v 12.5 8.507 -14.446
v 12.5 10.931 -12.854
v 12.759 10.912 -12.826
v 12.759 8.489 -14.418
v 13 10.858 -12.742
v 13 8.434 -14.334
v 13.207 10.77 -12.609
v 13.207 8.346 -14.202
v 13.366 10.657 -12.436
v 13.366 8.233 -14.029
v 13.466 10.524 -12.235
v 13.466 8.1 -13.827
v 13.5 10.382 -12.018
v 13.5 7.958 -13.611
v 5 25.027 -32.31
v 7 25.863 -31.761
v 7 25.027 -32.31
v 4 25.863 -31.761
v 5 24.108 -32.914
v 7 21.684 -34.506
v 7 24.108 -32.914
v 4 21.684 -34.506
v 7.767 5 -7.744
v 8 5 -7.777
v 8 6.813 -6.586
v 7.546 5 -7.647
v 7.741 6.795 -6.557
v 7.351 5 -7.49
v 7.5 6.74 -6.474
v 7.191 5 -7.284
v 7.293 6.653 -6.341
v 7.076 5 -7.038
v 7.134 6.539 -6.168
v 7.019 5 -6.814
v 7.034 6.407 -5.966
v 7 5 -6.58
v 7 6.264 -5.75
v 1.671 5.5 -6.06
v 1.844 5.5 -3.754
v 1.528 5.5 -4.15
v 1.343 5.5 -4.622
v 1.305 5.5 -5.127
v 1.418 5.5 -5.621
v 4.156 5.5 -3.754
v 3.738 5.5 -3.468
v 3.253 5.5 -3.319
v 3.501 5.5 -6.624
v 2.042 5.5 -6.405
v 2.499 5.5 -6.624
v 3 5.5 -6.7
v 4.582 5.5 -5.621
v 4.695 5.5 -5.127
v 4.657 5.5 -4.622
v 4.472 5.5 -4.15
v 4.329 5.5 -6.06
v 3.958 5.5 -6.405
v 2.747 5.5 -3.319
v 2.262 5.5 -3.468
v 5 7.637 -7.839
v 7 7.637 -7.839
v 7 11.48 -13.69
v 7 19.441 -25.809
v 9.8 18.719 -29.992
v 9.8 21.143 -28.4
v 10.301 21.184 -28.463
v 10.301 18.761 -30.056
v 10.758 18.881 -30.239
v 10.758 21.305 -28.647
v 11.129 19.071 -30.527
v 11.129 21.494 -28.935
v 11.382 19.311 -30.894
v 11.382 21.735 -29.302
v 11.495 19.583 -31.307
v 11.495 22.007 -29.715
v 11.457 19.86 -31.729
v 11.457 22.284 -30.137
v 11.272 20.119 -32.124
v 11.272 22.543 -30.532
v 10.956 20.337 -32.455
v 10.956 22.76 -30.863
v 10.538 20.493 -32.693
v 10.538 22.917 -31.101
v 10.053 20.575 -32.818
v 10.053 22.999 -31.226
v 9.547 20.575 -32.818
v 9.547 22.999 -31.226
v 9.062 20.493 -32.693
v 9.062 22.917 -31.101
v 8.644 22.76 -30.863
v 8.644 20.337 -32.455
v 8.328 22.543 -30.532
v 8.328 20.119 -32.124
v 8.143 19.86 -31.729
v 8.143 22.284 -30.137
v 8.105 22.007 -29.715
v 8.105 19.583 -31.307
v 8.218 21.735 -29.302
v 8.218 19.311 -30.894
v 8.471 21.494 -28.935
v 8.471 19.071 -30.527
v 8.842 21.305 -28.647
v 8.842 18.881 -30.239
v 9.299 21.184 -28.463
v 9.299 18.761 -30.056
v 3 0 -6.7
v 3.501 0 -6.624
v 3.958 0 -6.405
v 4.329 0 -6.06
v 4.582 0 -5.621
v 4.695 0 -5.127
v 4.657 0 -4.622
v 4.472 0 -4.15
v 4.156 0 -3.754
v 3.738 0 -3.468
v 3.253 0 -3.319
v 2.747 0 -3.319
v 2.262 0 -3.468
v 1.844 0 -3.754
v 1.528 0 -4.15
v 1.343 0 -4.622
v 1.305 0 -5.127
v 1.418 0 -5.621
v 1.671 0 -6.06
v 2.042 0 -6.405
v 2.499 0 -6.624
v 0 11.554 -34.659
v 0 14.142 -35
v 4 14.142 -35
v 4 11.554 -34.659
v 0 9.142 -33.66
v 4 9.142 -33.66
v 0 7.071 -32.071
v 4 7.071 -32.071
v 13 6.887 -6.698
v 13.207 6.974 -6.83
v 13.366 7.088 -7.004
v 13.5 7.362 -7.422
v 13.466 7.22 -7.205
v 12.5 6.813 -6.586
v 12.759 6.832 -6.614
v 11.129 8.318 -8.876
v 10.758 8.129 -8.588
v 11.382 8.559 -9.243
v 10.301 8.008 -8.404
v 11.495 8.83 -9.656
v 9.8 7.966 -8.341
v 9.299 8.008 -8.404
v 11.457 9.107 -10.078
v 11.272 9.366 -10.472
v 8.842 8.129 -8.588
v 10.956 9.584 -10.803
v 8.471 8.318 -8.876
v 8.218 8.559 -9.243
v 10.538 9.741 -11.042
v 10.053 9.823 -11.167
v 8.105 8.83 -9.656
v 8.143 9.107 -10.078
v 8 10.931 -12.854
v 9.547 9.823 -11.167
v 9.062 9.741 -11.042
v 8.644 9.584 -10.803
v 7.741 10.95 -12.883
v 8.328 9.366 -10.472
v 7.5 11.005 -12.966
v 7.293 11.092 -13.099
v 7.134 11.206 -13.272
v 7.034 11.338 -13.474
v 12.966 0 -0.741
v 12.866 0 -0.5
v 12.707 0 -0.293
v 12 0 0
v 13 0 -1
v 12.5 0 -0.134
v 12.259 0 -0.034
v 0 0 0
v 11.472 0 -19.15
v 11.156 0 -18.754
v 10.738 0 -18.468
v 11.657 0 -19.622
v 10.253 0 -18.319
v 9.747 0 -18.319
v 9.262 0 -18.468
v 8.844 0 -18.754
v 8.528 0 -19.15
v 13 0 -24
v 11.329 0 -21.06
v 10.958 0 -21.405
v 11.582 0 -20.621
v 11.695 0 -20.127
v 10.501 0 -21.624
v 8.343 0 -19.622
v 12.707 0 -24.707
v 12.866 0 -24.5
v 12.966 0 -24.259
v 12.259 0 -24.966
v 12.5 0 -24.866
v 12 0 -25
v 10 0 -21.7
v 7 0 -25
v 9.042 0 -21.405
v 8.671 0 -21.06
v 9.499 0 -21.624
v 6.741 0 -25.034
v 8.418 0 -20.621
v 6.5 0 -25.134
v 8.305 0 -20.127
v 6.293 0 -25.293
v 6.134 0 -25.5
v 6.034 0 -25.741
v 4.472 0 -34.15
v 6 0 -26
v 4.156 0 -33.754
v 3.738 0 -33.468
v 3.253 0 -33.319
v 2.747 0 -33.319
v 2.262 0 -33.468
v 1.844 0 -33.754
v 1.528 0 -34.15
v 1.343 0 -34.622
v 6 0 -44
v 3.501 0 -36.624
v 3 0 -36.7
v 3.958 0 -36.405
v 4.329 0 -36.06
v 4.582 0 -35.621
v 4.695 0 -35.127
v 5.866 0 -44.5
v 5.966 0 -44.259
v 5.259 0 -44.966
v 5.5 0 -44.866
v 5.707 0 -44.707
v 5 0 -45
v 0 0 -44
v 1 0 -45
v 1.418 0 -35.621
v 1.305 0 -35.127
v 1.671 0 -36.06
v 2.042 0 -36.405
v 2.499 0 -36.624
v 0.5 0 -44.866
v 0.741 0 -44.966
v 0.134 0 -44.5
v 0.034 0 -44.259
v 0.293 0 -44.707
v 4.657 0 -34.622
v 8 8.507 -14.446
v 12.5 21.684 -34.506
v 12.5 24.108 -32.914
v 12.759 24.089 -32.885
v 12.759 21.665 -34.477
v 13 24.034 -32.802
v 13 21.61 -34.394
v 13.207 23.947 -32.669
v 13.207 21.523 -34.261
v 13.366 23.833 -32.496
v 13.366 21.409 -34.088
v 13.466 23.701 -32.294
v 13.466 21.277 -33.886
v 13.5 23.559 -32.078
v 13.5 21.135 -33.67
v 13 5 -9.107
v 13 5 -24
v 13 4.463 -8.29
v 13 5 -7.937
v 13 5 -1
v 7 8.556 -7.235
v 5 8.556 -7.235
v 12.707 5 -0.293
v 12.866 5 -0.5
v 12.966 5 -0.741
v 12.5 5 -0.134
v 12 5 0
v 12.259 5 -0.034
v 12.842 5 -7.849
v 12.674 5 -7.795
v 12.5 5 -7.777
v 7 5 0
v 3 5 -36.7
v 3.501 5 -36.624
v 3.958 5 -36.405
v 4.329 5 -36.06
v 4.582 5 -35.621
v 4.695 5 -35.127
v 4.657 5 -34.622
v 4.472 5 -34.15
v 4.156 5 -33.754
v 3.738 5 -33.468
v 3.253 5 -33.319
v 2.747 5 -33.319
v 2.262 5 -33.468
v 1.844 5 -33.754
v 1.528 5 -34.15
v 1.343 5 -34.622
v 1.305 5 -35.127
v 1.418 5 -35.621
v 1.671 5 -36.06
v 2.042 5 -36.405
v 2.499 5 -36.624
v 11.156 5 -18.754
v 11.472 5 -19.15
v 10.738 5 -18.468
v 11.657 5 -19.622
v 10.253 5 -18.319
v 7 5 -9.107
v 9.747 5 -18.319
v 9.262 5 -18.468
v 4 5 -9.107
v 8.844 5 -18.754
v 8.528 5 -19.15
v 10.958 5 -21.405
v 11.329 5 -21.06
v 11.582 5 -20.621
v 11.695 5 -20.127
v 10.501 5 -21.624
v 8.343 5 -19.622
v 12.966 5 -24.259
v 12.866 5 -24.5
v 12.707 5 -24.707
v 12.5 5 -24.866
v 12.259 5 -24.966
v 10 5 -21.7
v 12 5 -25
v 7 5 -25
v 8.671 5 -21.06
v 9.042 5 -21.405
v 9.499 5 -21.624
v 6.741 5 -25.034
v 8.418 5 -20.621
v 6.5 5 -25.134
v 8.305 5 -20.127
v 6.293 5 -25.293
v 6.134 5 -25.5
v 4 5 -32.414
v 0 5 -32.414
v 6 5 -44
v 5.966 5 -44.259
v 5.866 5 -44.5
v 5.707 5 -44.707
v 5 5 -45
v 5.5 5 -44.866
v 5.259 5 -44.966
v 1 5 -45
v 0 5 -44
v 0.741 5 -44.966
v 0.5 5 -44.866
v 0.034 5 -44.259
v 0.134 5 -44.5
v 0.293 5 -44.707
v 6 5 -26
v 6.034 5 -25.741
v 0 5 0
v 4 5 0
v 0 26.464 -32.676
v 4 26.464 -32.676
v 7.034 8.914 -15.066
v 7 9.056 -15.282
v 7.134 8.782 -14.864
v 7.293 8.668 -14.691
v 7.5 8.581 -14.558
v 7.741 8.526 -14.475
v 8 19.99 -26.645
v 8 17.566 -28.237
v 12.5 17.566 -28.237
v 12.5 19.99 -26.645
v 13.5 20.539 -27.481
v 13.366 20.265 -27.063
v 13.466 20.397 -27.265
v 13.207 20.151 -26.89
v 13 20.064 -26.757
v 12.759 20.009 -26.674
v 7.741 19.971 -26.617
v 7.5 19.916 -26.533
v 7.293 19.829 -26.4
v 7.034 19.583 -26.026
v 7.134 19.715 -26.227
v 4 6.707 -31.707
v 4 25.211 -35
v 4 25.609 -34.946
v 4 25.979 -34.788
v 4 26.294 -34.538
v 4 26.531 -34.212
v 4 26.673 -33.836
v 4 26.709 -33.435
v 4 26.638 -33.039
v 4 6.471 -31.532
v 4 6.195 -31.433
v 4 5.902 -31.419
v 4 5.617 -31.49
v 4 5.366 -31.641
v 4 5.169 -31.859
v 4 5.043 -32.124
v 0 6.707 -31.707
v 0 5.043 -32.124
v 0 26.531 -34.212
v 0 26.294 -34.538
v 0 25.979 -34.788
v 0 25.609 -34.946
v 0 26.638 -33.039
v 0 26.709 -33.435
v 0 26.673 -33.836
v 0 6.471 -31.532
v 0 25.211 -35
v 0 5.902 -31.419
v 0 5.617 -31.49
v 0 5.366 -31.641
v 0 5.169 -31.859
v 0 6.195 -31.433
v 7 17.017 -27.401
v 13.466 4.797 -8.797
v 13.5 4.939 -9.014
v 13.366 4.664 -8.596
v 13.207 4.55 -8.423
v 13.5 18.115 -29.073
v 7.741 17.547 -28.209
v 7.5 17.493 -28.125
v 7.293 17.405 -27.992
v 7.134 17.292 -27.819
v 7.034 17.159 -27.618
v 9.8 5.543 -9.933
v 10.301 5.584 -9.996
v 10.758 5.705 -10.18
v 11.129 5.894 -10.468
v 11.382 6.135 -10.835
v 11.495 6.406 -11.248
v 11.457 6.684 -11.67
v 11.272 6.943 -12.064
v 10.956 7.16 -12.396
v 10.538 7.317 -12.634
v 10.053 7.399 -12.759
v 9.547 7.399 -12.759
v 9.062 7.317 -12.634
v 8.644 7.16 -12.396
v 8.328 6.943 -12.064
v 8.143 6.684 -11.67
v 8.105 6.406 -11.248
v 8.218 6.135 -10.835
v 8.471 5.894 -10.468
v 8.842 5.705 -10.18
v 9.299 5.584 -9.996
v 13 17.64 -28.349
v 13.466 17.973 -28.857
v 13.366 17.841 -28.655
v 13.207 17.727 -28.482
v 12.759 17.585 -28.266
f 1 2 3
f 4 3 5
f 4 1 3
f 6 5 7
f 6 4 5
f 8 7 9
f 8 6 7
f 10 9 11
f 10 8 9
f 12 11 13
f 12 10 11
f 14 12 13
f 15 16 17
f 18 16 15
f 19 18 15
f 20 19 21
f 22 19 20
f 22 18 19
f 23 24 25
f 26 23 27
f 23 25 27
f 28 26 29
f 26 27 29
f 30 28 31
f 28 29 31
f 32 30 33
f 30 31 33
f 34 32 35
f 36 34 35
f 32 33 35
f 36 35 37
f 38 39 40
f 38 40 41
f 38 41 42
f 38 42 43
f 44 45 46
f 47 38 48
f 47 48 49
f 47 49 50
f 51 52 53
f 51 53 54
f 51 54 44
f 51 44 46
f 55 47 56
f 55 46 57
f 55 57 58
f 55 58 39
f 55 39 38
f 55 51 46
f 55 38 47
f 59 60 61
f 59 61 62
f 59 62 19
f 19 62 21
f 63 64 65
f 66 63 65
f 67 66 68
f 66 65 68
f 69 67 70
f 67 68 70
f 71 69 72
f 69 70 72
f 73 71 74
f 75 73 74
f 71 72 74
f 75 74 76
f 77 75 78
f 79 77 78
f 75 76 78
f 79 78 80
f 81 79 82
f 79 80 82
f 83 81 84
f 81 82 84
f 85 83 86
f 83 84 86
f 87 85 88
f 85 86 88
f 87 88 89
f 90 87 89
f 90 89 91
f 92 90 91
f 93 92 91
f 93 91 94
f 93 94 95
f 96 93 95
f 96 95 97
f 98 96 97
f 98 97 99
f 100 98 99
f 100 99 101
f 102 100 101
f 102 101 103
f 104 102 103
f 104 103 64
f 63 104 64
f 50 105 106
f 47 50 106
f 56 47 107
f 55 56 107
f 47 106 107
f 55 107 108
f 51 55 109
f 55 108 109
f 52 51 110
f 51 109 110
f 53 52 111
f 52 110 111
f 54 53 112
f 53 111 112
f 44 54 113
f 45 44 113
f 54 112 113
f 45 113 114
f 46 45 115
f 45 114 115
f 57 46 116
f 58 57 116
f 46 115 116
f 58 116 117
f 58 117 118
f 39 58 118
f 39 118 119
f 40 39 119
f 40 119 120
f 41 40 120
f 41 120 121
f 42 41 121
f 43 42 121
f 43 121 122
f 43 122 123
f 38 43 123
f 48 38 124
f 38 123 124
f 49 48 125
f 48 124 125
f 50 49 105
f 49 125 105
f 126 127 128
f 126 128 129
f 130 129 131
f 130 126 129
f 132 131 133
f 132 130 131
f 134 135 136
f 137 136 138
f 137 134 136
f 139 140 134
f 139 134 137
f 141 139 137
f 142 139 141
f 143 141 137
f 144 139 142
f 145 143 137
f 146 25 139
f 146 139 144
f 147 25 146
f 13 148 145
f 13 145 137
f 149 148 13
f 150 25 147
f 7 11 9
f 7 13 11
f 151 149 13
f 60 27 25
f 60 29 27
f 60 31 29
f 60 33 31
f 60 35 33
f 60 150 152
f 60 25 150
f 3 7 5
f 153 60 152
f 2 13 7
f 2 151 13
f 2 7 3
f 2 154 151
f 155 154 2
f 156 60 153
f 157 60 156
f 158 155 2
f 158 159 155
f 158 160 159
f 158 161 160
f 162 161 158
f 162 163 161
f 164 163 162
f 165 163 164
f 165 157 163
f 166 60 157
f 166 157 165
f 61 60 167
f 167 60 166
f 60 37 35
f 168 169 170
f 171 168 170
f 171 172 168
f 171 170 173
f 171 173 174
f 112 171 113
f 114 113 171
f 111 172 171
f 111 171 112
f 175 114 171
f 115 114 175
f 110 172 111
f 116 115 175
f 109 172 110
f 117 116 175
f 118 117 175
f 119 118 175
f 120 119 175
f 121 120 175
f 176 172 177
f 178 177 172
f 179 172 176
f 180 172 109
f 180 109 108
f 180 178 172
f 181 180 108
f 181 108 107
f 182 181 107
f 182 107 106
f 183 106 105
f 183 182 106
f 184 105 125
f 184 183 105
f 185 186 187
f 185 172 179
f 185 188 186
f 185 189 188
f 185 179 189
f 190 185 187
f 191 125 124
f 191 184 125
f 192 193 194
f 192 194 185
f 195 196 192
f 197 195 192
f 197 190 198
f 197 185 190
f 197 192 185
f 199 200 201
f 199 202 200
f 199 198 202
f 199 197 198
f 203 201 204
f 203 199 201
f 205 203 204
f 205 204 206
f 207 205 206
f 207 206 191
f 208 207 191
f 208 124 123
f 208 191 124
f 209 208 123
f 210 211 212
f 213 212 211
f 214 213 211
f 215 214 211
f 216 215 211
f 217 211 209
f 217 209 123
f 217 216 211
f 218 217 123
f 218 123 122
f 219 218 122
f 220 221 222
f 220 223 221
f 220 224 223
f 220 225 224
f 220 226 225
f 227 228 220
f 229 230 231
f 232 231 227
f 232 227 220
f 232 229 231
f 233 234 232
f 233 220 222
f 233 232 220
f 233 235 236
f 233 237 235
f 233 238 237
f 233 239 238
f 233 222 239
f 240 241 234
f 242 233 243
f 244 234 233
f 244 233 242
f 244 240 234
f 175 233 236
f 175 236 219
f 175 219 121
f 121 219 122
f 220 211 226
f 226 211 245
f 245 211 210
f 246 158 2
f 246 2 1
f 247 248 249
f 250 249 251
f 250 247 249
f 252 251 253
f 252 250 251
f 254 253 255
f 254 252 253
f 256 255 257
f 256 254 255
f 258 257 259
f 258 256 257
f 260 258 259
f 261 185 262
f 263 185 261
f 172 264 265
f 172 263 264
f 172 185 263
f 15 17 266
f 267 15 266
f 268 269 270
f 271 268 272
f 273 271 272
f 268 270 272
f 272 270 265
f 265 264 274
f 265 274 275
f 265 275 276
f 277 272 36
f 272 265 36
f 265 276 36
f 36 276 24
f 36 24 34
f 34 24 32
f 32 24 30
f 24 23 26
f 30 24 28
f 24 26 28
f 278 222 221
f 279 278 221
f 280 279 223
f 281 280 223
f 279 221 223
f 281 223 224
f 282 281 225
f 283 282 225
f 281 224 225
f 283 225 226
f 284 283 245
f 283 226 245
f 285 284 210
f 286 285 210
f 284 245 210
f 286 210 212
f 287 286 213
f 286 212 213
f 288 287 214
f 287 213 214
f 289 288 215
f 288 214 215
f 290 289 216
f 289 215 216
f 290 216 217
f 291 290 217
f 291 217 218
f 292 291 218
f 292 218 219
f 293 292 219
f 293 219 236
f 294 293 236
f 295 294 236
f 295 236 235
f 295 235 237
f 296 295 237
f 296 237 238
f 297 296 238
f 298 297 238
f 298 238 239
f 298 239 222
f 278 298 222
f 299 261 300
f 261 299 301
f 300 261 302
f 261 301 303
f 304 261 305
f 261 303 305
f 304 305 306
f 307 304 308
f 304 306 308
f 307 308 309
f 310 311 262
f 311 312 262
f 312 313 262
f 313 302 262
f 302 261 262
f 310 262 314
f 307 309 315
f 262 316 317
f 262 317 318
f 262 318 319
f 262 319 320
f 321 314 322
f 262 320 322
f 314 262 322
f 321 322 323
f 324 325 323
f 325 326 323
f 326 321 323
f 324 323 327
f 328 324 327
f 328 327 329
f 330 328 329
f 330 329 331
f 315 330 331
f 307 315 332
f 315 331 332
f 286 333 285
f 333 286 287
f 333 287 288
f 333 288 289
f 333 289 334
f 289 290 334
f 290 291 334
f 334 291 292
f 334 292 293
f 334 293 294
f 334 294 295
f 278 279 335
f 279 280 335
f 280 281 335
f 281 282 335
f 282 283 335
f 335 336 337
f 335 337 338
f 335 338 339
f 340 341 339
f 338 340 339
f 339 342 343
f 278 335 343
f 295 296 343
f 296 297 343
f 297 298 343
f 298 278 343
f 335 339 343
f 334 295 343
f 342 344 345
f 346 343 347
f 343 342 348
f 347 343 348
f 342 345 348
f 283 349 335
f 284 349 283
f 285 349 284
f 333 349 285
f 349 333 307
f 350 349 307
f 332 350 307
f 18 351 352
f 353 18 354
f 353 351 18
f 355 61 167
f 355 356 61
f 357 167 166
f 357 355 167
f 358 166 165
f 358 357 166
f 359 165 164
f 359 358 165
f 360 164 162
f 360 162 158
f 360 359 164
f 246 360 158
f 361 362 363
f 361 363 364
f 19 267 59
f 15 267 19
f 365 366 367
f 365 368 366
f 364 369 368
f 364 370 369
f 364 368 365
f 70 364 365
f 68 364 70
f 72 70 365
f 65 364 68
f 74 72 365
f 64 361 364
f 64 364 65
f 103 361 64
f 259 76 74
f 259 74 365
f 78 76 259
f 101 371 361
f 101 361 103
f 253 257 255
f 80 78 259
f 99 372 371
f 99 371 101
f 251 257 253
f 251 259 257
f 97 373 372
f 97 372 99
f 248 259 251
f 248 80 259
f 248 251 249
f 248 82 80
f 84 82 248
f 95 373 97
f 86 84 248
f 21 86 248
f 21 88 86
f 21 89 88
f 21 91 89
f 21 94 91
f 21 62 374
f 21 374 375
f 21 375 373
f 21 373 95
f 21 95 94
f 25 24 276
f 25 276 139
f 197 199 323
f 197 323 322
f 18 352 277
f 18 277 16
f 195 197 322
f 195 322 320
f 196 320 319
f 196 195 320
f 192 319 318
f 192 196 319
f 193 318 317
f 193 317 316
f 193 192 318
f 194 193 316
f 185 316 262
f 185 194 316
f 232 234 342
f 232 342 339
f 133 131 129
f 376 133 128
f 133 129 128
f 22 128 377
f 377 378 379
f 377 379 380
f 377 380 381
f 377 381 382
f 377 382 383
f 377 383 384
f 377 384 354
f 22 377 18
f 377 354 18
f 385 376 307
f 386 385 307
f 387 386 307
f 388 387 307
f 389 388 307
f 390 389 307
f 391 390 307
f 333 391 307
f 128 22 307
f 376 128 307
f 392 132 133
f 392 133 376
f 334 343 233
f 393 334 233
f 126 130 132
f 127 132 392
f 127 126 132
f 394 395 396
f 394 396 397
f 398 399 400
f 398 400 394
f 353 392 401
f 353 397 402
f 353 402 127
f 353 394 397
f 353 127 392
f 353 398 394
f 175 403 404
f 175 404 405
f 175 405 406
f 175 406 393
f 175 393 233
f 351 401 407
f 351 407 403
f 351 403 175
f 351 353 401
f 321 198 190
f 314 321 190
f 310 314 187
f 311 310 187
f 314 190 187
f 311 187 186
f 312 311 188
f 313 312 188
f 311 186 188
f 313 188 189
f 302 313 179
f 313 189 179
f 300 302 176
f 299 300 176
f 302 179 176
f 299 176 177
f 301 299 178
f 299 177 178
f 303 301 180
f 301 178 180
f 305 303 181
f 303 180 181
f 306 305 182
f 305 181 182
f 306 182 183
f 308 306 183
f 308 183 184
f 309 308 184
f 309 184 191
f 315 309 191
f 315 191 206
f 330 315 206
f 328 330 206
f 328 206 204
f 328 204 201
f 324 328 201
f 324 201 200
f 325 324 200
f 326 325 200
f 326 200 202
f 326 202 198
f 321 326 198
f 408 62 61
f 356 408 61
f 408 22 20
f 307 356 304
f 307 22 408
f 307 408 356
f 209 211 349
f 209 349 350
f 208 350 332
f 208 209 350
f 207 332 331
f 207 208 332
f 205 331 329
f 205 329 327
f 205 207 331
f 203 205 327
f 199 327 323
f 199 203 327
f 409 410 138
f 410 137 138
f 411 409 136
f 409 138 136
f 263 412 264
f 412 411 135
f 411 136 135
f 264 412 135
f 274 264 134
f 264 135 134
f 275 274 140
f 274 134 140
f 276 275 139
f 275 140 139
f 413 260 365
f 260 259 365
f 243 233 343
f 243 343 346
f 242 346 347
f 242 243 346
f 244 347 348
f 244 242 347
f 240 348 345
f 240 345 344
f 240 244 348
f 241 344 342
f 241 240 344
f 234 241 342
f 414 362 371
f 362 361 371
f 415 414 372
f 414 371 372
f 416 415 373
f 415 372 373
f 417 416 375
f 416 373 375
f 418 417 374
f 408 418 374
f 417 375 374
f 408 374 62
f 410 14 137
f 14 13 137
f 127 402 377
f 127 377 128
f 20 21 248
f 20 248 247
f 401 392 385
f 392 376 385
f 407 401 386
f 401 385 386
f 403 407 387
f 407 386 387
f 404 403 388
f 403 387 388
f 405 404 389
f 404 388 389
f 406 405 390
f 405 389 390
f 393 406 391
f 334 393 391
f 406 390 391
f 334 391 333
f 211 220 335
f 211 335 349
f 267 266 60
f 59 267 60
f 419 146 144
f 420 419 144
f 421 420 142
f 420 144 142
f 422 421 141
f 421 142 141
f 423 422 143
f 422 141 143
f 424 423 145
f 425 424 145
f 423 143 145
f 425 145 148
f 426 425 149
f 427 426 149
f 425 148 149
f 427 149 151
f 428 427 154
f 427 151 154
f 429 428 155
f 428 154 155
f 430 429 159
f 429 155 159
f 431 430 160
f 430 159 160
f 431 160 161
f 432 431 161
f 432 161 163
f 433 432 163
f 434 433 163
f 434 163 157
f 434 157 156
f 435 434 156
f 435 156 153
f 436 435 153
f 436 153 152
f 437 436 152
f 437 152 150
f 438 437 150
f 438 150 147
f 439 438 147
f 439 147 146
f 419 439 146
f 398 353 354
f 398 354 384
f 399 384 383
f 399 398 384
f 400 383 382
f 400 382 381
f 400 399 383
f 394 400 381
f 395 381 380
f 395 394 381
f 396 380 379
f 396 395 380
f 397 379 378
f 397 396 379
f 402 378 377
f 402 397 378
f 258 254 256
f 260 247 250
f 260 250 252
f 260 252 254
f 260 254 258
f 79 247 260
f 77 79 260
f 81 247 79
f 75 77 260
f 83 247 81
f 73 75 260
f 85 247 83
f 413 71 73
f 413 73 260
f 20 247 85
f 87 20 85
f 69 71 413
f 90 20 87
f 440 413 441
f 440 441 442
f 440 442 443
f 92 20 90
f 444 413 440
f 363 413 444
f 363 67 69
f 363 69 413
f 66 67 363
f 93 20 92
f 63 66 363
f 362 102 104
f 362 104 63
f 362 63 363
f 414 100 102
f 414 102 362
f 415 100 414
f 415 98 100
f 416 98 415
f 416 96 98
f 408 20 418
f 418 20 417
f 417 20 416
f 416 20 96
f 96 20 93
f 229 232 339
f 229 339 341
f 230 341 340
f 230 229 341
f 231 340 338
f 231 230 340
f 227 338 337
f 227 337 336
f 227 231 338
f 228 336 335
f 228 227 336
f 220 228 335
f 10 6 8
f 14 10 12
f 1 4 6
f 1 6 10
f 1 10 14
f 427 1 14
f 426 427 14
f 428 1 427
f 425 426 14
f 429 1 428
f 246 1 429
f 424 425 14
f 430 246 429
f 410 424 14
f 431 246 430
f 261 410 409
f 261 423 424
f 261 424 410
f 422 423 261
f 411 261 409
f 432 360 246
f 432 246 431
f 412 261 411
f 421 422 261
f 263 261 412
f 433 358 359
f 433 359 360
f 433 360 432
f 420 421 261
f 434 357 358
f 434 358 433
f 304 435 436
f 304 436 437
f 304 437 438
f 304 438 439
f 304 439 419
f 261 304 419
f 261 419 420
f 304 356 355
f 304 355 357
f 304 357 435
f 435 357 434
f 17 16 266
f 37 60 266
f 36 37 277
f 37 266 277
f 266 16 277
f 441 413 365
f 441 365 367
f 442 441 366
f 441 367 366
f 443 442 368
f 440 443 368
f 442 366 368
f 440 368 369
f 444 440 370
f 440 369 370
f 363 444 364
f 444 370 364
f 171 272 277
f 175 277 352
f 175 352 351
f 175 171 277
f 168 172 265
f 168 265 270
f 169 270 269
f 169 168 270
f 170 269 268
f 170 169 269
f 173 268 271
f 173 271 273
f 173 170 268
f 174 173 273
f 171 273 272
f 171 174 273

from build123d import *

# Parameters (mm, degrees)
EXTRUDE_1_DEPTH                = 5
EXTRUDE_3_DEPTH                = 4
EXTRUDE_4_DEPTH                = 3
CUT_EXTRUDE_1_DEPTH            = 2
SKETCH_6_R                     = 1.7
CUT_EXTRUDE_1_2_DEPTH          = 5.5
EXTRUDE_5_DEPTH                = 6.5
FILLET_1_R                     = 1
CUT_EXTRUDE_2_REACH            = 56.175
SKETCH_8_R                     = 1.7
FILLET_2_R                     = 1
PATTERN_LINEAR_2_COUNT         = 2
PATTERN_LINEAR_2_PITCH         = 24
FILLET_1_OF_PATTERN_LINEAR_2_R = 1
FILLET_2_OF_PATTERN_LINEAR_2_R = 1
FILLET_3_R                     = 1
FILLET_4_R                     = 1


with BuildPart() as part:
    # 草图1 → 凸台-拉伸1 (new body)
    with BuildSketch(Plane(origin=(0, 0, 0), x_dir=(1, 0, 0), z_dir=(0, 1, 0))):
        with BuildLine():
            Line((0, 0), (0, 44))
            ThreePointArc((0, 44), (0.292893219, 44.707106781), (1, 45))
            Line((1, 45), (5, 45))
            ThreePointArc((5, 45), (5.707106781, 44.707106781), (6, 44))
            Line((6, 44), (6, 26))
            ThreePointArc((6, 26), (6.292893219, 25.292893219), (7, 25))
            Line((7, 25), (12, 25))
            ThreePointArc((12, 25), (12.707106781, 24.707106781), (13, 24))
            Line((13, 24), (13, 1))
            ThreePointArc((13, 1), (12.707106781, 0.292893219), (12, 0))
            Line((12, 0), (0, 0))
        make_face()
    extrude(amount=EXTRUDE_1_DEPTH)

    # 草图3 → 凸台-拉伸3 (add)
    with BuildSketch(Plane(origin=(0, 0, 0), x_dir=(0, 0, -1), z_dir=(1, 0, 0))):
        with BuildLine():
            Line((30, 5), (0, 5))
            Line((0, 5), (32.676465773, 26.464426075))
            ThreePointArc((32.676465773, 26.464426075), (34.212284585, 26.53080998), (35, 25.210715033))
            Line((35, 25.210715033), (35, 14.142135624))
            ThreePointArc((35, 14.142135624), (34.238795325, 10.3153013), (32.071067812, 7.071067812))
            Line((32.071067812, 7.071067812), (30, 5))
        make_face()
    extrude(amount=EXTRUDE_3_DEPTH)

    # 草图4 → 凸台-拉伸4 (add)
    with BuildSketch(Plane(origin=(4, 0, 0), x_dir=(0, 0, -1), z_dir=(1, 0, 0))):
        Polygon((0, 5), (31.760679732, 25.862867084), (34.505793822, 21.683830277), (9.107089607, 5), align=None)
    extrude(amount=EXTRUDE_4_DEPTH)

    # 草图5 → Cut-Extrude 1 (cut)
    with BuildSketch(Plane(origin=(7, 0, 0), x_dir=(0, 0, -1), z_dir=(1, 0, 0))):
        Polygon((32.30970255, 25.027059723), (7.235481709, 8.556375183), (7.839406809, 7.636987085), (32.91362765, 24.107671625), align=None)
    extrude(amount=-CUT_EXTRUDE_1_DEPTH, mode=Mode.SUBTRACT)

    # 草图6 → Cut-Extrude 1 2 (cut)
    with BuildSketch(Plane.XZ):
        with Locations(Location((3, -5, 0), (0, 0, 270))):
            Circle(SKETCH_6_R)
        with Locations(Location((3, -35, 0), (0, 0, 270))):
            Circle(SKETCH_6_R)
        with Locations(Location((10, -20, 0), (0, 0, 270))):
            Circle(SKETCH_6_R)
    extrude(amount=-CUT_EXTRUDE_1_2_DEPTH, mode=Mode.SUBTRACT)

    # 草图7 → 凸台-拉伸5 (add)
    with BuildSketch(Plane(origin=(7, 0, 0), x_dir=(0, 0, -1), z_dir=(1, 0, 0))):
        Polygon((32.91362765, 24.107671625), (34.505793822, 21.683830277), (28.237238612, 17.566159142), (26.64507244, 19.99000049), align=None)
    extrude_5 = extrude(amount=EXTRUDE_5_DEPTH)

    # 圆角1
    fillet_1_edges = [part.edges().sort_by_distance(p)[0] for p in [
        (13.5, 18.778079816, -27.441155526),
        (13.5, 22.895750951, -33.709710736),
    ]]
    fillet(fillet_1_edges, radius=FILLET_1_R)

    # 草图8 → 切除-拉伸2 (cut, up to next)
    with BuildSketch(Plane(origin=(0, 1.737674268, 1.141438646), x_dir=(1, 0, 0), z_dir=(0, 0.8358073613682734, 0.549022817998127)), mode=Mode.PRIVATE) as cut_extrude_2_sk1:
        with Locations(Location((9.8, 37.04511409, 0), (0, 0, 270))):
            Circle(SKETCH_8_R)
    cut_extrude_2_tool1 = extrude(cut_extrude_2_sk1.sketch, amount=-CUT_EXTRUDE_2_REACH, mode=Mode.PRIVATE) & part.part
    cut_extrude_2 = cut_extrude_2_tool1.solids().sort_by_distance((9.8, 22.076287, -29.82114))[0]
    add(cut_extrude_2, mode=Mode.SUBTRACT)

    # 圆角2
    fillet_2_edges = [part.edges().sort_by_distance(p)[0] for p in [
        (7, 18.778079816, -27.441155526),
    ]]
    fillet(fillet_2_edges, radius=FILLET_2_R)

    # 阵列(线性)2: 凸台-拉伸5, 切除-拉伸2 ×2
    with Locations(*[Vector(0, -0.549022817998128, 0.8358073613682727) * (i * PATTERN_LINEAR_2_PITCH) for i in range(1, PATTERN_LINEAR_2_COUNT)]):
        add(extrude_5)
        add(cut_extrude_2, mode=Mode.SUBTRACT)

    # 圆角1 of 阵列(线性)2
    fillet_1_of_pattern_linear_2_edges = [part.edges().sort_by_distance(p)[0] for p in [
        (13.5, 5.601532184, -7.381778853),
        (13.5, 9.719203319, -13.650334063),
    ]]
    fillet(fillet_1_of_pattern_linear_2_edges, radius=FILLET_1_OF_PATTERN_LINEAR_2_R)

    # 圆角2 of 阵列(线性)2
    fillet_2_of_pattern_linear_2_edges = [part.edges().sort_by_distance(p)[0] for p in [
        (7, 5.601532184, -7.381778853),
    ]]
    fillet(fillet_2_of_pattern_linear_2_edges, radius=FILLET_2_OF_PATTERN_LINEAR_2_R)

    # 圆角3
    fillet_3_edges = [part.edges().sort_by_distance(p)[0] for p in [
        (7, 9.719203319, -13.650334063),
    ]]
    fillet(fillet_3_edges, radius=FILLET_3_R)

    # 圆角4
    fillet_4_edges = [part.edges().sort_by_distance(p)[0] for p in [
        (2, 5, -30),
    ]]
    fillet(fillet_4_edges, radius=FILLET_4_R)


solid = part.part
